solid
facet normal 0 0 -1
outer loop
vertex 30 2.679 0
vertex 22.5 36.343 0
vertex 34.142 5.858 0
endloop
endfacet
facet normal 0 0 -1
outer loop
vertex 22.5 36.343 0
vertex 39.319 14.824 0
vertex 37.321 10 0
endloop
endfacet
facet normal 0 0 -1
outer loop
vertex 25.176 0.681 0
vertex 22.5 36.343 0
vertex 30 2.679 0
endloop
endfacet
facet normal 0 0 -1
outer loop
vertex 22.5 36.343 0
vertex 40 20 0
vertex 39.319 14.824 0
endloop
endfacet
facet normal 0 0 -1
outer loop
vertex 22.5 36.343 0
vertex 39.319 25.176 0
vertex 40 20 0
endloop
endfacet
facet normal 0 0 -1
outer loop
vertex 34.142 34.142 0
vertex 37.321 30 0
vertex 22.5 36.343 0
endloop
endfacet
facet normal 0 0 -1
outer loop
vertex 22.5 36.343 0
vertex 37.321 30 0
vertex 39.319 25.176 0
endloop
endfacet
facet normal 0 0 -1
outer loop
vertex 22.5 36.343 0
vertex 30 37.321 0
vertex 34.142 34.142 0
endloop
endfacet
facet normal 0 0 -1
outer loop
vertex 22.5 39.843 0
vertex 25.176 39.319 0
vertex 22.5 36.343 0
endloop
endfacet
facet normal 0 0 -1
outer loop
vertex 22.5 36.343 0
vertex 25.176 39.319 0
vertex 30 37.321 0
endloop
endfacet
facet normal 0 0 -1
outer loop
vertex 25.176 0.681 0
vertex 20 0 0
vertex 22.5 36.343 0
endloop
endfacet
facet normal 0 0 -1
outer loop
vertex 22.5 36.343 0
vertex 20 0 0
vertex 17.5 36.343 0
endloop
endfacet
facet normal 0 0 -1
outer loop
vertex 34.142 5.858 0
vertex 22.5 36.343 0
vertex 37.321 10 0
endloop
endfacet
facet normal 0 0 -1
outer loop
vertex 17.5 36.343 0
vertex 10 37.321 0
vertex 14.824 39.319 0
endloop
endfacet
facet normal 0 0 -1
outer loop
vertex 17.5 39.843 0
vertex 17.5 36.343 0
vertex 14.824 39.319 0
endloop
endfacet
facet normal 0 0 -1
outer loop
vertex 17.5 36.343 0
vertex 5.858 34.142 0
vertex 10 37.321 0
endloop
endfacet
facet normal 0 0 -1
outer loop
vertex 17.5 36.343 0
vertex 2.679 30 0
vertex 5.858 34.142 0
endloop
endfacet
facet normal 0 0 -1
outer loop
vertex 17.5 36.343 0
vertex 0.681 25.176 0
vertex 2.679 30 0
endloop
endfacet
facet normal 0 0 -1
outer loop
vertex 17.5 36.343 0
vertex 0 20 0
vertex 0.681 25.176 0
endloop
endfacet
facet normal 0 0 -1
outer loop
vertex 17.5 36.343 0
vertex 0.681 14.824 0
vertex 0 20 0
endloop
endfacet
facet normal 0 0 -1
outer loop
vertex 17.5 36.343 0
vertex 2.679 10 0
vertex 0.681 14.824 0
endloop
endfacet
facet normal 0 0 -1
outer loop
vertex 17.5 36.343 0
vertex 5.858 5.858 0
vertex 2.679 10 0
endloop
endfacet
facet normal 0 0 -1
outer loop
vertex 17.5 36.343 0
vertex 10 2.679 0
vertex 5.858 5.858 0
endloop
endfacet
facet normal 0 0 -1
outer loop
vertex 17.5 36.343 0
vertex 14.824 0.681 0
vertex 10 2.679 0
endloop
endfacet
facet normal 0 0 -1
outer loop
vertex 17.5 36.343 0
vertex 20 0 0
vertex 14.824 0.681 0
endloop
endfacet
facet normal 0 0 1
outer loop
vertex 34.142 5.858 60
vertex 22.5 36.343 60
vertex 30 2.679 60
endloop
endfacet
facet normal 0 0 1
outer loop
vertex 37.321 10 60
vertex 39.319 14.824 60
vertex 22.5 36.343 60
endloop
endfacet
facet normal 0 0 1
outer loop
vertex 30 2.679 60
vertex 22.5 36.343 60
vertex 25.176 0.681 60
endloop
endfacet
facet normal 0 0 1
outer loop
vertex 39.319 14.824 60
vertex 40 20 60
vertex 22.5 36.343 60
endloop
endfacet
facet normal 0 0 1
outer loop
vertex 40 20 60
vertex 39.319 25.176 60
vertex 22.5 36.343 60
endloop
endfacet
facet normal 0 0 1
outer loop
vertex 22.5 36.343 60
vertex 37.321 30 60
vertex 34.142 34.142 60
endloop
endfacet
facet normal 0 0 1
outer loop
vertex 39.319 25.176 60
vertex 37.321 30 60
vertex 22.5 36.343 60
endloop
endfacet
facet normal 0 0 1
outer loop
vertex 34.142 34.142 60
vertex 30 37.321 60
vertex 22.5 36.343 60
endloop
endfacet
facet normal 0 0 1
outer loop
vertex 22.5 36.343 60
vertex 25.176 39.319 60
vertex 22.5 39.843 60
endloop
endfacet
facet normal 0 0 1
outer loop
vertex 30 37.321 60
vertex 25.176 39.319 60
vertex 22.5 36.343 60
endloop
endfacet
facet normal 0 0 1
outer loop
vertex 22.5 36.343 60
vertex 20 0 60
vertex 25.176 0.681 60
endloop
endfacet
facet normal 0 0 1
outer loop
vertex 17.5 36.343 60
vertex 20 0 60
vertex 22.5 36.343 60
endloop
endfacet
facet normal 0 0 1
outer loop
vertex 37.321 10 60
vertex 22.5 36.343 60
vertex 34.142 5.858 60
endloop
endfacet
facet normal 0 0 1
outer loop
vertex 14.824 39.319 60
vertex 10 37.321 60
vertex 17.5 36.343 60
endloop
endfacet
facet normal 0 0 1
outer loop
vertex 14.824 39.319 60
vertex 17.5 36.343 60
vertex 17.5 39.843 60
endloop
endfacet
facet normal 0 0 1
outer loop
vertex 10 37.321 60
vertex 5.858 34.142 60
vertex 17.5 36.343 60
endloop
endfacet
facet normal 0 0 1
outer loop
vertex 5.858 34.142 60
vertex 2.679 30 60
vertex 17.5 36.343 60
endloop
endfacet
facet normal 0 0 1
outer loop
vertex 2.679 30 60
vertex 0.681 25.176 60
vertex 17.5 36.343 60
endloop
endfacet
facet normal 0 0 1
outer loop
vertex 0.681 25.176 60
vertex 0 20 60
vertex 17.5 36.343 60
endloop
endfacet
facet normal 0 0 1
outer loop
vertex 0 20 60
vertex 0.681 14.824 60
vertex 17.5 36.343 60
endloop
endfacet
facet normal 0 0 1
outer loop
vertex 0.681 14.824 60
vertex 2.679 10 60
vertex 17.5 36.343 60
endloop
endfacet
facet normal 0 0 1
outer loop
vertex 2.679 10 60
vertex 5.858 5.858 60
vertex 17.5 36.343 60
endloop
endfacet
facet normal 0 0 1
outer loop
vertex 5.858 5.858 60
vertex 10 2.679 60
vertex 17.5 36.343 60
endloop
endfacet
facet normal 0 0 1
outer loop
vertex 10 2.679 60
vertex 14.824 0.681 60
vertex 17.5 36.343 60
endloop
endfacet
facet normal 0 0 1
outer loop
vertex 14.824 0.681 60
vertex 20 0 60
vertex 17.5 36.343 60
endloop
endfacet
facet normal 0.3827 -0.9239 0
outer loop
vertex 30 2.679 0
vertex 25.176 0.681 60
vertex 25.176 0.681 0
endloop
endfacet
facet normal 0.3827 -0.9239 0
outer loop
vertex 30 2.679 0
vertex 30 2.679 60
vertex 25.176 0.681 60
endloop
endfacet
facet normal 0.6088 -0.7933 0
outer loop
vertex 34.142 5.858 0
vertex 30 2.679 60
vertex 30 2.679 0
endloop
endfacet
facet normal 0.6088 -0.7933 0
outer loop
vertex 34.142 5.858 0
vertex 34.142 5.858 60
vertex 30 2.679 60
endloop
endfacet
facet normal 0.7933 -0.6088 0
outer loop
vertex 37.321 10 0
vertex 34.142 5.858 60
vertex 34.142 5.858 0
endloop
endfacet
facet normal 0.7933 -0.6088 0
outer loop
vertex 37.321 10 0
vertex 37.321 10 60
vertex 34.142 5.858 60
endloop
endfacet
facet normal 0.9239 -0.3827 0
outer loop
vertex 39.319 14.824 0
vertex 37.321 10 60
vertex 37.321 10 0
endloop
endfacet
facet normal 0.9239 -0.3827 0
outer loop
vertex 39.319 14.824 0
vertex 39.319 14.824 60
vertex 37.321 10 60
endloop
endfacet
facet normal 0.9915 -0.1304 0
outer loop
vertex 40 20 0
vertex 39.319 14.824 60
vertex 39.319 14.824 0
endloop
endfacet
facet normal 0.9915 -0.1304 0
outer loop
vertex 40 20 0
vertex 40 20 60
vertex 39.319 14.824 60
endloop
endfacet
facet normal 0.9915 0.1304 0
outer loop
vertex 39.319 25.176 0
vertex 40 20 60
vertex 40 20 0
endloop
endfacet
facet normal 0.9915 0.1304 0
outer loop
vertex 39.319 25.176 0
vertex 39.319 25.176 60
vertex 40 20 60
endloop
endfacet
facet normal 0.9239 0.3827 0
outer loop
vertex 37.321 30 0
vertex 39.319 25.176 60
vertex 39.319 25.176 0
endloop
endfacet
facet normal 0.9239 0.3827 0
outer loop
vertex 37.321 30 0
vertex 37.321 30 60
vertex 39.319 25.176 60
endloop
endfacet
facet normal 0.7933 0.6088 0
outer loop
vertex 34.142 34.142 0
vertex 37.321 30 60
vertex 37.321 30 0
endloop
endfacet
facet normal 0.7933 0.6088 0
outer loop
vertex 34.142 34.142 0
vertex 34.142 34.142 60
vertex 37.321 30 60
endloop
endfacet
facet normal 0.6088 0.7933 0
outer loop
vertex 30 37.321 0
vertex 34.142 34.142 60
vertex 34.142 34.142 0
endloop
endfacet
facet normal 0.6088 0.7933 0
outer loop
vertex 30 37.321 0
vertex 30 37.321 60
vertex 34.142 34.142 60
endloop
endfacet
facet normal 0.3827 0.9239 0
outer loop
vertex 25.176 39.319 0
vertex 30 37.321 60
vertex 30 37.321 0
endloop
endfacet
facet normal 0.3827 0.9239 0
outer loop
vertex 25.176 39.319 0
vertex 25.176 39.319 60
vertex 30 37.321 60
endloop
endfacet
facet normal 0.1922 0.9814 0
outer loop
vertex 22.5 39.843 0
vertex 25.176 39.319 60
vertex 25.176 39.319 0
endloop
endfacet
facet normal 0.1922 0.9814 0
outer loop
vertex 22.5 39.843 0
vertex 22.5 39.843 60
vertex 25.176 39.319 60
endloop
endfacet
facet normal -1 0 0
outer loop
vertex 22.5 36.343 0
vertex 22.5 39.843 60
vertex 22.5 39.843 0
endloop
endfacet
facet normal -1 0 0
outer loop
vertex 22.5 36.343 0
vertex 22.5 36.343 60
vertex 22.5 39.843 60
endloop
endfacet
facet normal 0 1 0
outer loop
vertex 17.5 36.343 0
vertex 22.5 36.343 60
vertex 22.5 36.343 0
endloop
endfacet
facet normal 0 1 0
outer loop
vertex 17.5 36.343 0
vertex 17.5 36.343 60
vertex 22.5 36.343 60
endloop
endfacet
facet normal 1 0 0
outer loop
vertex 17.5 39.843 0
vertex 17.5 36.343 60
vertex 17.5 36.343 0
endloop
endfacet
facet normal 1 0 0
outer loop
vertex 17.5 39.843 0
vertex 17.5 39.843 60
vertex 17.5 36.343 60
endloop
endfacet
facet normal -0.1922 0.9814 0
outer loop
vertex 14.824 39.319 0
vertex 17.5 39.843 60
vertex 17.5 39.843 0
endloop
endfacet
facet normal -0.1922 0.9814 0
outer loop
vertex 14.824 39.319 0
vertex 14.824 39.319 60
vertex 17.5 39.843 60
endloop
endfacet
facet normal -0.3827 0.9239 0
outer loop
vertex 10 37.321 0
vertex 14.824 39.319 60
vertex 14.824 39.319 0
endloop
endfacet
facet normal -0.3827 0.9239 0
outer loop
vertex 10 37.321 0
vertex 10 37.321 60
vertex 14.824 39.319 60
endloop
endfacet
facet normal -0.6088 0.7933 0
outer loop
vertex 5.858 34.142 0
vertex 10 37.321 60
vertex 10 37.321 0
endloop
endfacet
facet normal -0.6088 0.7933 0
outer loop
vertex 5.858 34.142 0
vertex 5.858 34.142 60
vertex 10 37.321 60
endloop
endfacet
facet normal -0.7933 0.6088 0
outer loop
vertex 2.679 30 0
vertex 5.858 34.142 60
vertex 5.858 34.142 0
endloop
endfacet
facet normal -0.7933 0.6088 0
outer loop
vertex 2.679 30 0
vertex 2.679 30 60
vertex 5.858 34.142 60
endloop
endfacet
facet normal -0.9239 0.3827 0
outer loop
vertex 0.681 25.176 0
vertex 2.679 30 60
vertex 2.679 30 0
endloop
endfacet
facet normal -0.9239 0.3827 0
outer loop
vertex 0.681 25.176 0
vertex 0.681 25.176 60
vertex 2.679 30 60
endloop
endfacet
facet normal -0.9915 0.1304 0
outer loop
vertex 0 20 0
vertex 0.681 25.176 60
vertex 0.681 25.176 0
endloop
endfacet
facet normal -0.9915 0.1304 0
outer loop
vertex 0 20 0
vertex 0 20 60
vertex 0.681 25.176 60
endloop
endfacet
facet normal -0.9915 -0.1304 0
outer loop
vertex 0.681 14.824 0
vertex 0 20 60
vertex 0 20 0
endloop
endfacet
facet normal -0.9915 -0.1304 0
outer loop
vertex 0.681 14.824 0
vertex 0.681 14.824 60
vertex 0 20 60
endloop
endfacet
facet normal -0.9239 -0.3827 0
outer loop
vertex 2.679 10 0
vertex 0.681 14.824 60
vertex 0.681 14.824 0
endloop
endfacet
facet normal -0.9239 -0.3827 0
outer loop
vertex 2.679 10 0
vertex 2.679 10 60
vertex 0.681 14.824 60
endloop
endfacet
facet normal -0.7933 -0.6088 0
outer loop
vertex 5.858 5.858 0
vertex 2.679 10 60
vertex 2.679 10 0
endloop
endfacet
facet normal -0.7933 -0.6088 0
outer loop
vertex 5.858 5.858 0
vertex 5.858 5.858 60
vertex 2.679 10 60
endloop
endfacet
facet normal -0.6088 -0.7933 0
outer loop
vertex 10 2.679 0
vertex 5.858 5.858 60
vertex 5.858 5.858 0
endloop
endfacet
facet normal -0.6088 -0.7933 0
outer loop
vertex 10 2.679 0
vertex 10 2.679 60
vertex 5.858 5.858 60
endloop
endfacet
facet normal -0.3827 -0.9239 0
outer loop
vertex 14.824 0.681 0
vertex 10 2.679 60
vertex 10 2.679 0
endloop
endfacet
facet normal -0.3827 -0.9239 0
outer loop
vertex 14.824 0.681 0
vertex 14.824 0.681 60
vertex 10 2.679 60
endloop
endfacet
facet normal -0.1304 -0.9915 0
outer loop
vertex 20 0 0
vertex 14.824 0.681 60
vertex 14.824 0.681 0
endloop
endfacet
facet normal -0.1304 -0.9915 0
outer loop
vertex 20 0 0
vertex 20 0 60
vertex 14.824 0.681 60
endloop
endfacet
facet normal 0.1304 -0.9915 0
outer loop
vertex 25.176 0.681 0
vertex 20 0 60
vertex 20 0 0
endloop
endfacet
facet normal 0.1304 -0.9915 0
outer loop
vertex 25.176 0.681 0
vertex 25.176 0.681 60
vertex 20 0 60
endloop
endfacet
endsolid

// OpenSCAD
$fn = 32;

// ----------------------------------------------------------------------
// Keyway shaft: d40 shaft, key 5 x 3.5 mm
// ----------------------------------------------------------------------

// --- parameters (mm) ---
shaft_r = 20;             // shaft radius
key_w = 5;                // keyway width
key_d = 3.5;              // keyway depth below the surface line
plate_t = 60;             // shaft length, Z (extrusion height)

shaft_d = 2 * shaft_r;  // shaft diameter
circle_step = 15;  // polygon sampling step, degrees

profile = [[14.824, 39.319], [10, 37.321], [5.858, 34.142], [2.679, 30], [0.681, 25.176], [0, 20], [0.681, 14.824], [2.679, 10], [5.858, 5.858], [10, 2.679], [14.824, 0.681], [20, 0], [25.176, 0.681], [30, 2.679], [34.142, 5.858], [37.321, 10], [39.319, 14.824], [40, 20], [39.319, 25.176], [37.321, 30], [34.142, 34.142], [30, 37.321], [25.176, 39.319], [22.5, 39.843], [22.5, 36.343], [17.5, 36.343], [17.5, 39.843]];  // primary outline, 27 points, counter clockwise

// --- the one profile operation ---
linear_extrude(height = plate_t) polygon(points = profile);
